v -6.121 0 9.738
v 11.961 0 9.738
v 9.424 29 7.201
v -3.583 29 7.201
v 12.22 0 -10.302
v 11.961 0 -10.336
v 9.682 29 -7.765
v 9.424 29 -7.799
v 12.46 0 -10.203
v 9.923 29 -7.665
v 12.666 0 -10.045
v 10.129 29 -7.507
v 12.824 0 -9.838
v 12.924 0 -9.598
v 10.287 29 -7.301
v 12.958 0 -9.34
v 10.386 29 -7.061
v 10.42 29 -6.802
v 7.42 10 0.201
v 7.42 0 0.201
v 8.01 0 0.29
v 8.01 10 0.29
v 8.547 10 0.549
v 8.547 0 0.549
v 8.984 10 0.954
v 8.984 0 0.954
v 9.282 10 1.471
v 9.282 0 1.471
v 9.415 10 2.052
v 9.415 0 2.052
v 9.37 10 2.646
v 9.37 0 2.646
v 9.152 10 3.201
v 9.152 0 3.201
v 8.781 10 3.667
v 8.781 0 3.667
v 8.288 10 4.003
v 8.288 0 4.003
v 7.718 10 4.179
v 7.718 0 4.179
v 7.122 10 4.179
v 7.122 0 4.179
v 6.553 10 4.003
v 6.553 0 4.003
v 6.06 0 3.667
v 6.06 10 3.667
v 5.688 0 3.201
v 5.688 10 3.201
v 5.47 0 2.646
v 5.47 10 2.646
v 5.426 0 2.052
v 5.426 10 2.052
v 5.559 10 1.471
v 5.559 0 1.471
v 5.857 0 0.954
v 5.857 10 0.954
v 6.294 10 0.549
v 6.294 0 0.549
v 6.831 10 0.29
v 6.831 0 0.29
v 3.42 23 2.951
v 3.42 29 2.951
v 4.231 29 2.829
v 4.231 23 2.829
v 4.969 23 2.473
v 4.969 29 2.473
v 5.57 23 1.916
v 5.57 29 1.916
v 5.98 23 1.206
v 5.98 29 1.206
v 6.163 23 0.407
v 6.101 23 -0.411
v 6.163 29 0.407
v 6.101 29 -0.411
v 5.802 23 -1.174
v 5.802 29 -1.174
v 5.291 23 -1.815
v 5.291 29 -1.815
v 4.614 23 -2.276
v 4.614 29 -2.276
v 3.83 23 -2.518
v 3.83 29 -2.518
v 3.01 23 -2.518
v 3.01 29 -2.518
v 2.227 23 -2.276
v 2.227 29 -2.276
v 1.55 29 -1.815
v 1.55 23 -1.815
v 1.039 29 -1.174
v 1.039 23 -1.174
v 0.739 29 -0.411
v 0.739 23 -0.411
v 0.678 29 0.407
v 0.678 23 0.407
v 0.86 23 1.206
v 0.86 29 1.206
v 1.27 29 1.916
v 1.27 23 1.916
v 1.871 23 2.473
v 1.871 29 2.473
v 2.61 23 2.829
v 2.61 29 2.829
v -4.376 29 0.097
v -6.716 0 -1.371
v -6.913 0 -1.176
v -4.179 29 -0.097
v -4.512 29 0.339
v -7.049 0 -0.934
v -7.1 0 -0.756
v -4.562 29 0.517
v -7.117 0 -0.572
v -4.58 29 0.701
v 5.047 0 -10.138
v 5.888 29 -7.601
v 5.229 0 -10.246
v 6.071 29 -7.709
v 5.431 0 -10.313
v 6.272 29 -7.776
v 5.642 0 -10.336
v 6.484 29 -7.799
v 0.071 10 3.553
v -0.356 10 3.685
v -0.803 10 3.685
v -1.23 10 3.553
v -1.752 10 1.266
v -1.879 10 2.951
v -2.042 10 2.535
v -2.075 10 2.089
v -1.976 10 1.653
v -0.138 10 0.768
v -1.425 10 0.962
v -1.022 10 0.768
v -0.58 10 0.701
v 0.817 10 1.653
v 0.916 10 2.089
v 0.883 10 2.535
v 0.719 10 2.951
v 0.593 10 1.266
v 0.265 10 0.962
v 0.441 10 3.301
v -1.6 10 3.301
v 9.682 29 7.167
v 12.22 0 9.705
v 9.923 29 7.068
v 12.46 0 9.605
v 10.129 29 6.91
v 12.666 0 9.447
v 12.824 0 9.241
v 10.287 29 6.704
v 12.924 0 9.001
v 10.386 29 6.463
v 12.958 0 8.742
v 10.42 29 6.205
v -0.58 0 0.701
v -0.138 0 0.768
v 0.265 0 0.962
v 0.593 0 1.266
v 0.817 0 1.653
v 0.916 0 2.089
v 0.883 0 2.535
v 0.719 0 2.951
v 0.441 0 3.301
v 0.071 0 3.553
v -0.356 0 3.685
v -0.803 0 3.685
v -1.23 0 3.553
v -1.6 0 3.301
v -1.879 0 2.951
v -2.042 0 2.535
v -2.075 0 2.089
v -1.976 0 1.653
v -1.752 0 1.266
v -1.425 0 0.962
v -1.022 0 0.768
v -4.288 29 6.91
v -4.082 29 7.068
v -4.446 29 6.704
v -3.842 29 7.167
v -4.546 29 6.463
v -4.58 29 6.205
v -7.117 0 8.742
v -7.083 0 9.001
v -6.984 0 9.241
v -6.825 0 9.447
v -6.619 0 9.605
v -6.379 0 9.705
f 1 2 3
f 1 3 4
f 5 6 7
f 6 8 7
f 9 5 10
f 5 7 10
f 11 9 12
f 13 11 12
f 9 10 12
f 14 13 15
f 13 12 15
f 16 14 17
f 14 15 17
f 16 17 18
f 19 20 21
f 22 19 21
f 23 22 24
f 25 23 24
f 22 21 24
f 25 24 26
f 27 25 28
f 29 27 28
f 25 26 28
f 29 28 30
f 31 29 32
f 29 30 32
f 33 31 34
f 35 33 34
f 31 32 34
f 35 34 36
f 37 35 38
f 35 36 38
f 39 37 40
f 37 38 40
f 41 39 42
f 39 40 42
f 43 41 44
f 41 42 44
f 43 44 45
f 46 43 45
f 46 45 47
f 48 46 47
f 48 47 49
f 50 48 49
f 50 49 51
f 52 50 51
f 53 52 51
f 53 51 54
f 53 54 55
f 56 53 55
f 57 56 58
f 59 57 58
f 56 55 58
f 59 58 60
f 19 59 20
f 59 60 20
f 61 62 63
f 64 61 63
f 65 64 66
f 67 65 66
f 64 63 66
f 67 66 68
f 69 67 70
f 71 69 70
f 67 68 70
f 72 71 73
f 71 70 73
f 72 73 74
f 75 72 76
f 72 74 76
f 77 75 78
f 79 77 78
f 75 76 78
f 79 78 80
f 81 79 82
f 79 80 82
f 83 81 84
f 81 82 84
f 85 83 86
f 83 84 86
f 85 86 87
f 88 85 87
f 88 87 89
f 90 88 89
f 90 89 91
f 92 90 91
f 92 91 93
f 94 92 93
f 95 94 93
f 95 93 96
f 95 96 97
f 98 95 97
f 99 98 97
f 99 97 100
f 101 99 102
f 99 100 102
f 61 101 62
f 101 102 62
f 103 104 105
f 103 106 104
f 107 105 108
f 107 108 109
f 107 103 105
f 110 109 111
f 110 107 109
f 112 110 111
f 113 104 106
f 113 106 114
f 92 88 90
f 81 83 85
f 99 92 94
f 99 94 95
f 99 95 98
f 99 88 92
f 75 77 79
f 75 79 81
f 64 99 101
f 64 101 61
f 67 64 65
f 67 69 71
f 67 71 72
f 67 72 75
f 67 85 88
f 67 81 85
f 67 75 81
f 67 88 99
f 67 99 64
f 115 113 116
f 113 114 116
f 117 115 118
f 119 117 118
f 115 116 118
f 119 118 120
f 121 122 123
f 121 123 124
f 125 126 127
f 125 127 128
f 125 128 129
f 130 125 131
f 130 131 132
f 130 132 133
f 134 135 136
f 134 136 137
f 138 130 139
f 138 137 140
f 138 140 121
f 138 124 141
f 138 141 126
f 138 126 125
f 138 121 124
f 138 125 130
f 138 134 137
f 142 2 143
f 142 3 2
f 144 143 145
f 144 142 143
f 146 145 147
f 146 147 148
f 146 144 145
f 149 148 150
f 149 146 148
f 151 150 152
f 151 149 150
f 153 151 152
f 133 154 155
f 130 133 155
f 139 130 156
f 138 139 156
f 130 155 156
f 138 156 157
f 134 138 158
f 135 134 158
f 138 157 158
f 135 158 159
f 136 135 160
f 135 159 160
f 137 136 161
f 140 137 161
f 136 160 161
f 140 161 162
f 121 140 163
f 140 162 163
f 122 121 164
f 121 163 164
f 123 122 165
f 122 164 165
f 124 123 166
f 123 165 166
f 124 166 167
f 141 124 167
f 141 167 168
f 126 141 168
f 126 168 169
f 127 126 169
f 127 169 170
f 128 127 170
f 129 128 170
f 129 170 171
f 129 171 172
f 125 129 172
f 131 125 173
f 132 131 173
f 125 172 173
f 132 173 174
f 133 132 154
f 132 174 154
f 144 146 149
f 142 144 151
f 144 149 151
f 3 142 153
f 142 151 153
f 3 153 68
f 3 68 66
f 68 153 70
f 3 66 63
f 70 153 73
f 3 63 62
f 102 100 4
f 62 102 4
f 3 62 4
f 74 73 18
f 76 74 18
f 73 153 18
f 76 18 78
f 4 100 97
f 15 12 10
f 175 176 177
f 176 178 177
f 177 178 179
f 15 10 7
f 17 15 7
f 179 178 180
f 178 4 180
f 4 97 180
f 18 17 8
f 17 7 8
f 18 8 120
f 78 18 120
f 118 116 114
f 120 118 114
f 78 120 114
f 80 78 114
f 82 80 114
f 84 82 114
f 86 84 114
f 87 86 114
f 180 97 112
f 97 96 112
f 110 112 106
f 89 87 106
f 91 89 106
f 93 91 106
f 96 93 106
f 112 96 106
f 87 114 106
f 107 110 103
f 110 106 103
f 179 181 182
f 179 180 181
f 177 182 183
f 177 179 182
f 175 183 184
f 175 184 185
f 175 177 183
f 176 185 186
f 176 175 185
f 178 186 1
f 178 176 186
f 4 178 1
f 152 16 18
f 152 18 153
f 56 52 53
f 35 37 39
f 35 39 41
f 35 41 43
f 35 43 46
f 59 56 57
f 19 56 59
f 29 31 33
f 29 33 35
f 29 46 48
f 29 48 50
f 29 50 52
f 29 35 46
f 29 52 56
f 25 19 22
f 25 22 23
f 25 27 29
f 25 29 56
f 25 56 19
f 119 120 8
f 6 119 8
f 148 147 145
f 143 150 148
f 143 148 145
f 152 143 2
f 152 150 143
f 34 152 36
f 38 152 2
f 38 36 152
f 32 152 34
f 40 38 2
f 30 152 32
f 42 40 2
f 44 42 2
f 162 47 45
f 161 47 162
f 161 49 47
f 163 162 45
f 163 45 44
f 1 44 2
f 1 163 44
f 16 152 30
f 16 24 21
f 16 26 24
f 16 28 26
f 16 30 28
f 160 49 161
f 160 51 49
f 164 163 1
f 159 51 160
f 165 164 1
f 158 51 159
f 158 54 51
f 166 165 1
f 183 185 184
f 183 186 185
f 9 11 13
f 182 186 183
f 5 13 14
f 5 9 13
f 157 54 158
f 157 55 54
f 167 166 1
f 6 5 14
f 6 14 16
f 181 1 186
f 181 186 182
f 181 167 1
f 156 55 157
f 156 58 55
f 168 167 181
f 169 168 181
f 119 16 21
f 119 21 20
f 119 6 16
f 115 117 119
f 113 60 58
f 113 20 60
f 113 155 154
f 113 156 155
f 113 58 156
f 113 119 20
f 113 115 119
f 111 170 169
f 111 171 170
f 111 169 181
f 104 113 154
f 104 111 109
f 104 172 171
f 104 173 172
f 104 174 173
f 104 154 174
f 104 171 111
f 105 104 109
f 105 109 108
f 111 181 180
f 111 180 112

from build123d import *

# Parameters (mm, degrees)
BOSS_EXTRUDE1_DEPTH = 29
SKETCH2_R           = 1.5
SKETCH2_R_2         = 2
CUT_EXTRUDE1_DEPTH  = 10
SKETCH3_R           = 2.75
CUT_EXTRUDE2_DEPTH  = 6
DRAFT1_ANGLE        = 5
FILLET1_R           = 1


with BuildPart() as part:
    # Sketch1 → Boss-Extrude1 (new body)
    with BuildSketch(Plane(origin=(0, 0, 0), x_dir=(1, 0, 0), z_dir=(0, 1, 0))):
        Polygon((-4.579646018, -0.201327434), (6.153177369, 7.798672566), (10.420353982, 7.798672566), (10.420353982, -7.201327434), (-4.579646018, -7.201327434), align=None)
    extrude(amount=BOSS_EXTRUDE1_DEPTH)

    # Sketch2 → Cut-Extrude1 (cut)
    with BuildSketch(Plane.XZ):
        with Locations(Location((-0.579646018, 2.201327434, 0), (0, 0, 270))):
            Circle(SKETCH2_R)
        with Locations(Location((7.420353982, 2.201327434, 0), (0, 0, 270))):
            Circle(SKETCH2_R_2)
    extrude(amount=-CUT_EXTRUDE1_DEPTH, mode=Mode.SUBTRACT)

    # Sketch3 → Cut-Extrude2 (cut)
    with BuildSketch(Plane(origin=(0, 29, 0), x_dir=(1, 0, 0), z_dir=(0, 1, 0))):
        with Locations(Location((3.420353982, -0.201327434, 0), (0, 0, 270))):
            Circle(SKETCH3_R)
    extrude(amount=-CUT_EXTRUDE2_DEPTH, mode=Mode.SUBTRACT)

    # Draft1
    draft1_faces = [part.faces().sort_by_distance(p)[0] for p in [
        (8.286765676, 14.5, -7.798672566),
        (10.420353982, 14.5, -0.298672566),
        (2.920353982, 14.5, 7.201327434),
        (-4.579646018, 14.5, 3.701327434),
        (0.786765676, 14.5, -3.798672566),
    ]]
    draft(draft1_faces, Plane.ZX.offset(29), DRAFT1_ANGLE)

    # Fillet1
    fillet1_edges = [part.edges().sort_by_distance(p)[0] for p in [
        (-5.848231639, 14.5, -0.435318187),
        (5.7324043, 14.5, -9.067258187),
        (11.688939603, 14.5, -9.067258187),
        (11.688939603, 14.5, 8.469913055),
        (-5.848231639, 14.5, 8.469913055),
    ]]
    fillet(fillet1_edges, radius=FILLET1_R)


solid = part.part
